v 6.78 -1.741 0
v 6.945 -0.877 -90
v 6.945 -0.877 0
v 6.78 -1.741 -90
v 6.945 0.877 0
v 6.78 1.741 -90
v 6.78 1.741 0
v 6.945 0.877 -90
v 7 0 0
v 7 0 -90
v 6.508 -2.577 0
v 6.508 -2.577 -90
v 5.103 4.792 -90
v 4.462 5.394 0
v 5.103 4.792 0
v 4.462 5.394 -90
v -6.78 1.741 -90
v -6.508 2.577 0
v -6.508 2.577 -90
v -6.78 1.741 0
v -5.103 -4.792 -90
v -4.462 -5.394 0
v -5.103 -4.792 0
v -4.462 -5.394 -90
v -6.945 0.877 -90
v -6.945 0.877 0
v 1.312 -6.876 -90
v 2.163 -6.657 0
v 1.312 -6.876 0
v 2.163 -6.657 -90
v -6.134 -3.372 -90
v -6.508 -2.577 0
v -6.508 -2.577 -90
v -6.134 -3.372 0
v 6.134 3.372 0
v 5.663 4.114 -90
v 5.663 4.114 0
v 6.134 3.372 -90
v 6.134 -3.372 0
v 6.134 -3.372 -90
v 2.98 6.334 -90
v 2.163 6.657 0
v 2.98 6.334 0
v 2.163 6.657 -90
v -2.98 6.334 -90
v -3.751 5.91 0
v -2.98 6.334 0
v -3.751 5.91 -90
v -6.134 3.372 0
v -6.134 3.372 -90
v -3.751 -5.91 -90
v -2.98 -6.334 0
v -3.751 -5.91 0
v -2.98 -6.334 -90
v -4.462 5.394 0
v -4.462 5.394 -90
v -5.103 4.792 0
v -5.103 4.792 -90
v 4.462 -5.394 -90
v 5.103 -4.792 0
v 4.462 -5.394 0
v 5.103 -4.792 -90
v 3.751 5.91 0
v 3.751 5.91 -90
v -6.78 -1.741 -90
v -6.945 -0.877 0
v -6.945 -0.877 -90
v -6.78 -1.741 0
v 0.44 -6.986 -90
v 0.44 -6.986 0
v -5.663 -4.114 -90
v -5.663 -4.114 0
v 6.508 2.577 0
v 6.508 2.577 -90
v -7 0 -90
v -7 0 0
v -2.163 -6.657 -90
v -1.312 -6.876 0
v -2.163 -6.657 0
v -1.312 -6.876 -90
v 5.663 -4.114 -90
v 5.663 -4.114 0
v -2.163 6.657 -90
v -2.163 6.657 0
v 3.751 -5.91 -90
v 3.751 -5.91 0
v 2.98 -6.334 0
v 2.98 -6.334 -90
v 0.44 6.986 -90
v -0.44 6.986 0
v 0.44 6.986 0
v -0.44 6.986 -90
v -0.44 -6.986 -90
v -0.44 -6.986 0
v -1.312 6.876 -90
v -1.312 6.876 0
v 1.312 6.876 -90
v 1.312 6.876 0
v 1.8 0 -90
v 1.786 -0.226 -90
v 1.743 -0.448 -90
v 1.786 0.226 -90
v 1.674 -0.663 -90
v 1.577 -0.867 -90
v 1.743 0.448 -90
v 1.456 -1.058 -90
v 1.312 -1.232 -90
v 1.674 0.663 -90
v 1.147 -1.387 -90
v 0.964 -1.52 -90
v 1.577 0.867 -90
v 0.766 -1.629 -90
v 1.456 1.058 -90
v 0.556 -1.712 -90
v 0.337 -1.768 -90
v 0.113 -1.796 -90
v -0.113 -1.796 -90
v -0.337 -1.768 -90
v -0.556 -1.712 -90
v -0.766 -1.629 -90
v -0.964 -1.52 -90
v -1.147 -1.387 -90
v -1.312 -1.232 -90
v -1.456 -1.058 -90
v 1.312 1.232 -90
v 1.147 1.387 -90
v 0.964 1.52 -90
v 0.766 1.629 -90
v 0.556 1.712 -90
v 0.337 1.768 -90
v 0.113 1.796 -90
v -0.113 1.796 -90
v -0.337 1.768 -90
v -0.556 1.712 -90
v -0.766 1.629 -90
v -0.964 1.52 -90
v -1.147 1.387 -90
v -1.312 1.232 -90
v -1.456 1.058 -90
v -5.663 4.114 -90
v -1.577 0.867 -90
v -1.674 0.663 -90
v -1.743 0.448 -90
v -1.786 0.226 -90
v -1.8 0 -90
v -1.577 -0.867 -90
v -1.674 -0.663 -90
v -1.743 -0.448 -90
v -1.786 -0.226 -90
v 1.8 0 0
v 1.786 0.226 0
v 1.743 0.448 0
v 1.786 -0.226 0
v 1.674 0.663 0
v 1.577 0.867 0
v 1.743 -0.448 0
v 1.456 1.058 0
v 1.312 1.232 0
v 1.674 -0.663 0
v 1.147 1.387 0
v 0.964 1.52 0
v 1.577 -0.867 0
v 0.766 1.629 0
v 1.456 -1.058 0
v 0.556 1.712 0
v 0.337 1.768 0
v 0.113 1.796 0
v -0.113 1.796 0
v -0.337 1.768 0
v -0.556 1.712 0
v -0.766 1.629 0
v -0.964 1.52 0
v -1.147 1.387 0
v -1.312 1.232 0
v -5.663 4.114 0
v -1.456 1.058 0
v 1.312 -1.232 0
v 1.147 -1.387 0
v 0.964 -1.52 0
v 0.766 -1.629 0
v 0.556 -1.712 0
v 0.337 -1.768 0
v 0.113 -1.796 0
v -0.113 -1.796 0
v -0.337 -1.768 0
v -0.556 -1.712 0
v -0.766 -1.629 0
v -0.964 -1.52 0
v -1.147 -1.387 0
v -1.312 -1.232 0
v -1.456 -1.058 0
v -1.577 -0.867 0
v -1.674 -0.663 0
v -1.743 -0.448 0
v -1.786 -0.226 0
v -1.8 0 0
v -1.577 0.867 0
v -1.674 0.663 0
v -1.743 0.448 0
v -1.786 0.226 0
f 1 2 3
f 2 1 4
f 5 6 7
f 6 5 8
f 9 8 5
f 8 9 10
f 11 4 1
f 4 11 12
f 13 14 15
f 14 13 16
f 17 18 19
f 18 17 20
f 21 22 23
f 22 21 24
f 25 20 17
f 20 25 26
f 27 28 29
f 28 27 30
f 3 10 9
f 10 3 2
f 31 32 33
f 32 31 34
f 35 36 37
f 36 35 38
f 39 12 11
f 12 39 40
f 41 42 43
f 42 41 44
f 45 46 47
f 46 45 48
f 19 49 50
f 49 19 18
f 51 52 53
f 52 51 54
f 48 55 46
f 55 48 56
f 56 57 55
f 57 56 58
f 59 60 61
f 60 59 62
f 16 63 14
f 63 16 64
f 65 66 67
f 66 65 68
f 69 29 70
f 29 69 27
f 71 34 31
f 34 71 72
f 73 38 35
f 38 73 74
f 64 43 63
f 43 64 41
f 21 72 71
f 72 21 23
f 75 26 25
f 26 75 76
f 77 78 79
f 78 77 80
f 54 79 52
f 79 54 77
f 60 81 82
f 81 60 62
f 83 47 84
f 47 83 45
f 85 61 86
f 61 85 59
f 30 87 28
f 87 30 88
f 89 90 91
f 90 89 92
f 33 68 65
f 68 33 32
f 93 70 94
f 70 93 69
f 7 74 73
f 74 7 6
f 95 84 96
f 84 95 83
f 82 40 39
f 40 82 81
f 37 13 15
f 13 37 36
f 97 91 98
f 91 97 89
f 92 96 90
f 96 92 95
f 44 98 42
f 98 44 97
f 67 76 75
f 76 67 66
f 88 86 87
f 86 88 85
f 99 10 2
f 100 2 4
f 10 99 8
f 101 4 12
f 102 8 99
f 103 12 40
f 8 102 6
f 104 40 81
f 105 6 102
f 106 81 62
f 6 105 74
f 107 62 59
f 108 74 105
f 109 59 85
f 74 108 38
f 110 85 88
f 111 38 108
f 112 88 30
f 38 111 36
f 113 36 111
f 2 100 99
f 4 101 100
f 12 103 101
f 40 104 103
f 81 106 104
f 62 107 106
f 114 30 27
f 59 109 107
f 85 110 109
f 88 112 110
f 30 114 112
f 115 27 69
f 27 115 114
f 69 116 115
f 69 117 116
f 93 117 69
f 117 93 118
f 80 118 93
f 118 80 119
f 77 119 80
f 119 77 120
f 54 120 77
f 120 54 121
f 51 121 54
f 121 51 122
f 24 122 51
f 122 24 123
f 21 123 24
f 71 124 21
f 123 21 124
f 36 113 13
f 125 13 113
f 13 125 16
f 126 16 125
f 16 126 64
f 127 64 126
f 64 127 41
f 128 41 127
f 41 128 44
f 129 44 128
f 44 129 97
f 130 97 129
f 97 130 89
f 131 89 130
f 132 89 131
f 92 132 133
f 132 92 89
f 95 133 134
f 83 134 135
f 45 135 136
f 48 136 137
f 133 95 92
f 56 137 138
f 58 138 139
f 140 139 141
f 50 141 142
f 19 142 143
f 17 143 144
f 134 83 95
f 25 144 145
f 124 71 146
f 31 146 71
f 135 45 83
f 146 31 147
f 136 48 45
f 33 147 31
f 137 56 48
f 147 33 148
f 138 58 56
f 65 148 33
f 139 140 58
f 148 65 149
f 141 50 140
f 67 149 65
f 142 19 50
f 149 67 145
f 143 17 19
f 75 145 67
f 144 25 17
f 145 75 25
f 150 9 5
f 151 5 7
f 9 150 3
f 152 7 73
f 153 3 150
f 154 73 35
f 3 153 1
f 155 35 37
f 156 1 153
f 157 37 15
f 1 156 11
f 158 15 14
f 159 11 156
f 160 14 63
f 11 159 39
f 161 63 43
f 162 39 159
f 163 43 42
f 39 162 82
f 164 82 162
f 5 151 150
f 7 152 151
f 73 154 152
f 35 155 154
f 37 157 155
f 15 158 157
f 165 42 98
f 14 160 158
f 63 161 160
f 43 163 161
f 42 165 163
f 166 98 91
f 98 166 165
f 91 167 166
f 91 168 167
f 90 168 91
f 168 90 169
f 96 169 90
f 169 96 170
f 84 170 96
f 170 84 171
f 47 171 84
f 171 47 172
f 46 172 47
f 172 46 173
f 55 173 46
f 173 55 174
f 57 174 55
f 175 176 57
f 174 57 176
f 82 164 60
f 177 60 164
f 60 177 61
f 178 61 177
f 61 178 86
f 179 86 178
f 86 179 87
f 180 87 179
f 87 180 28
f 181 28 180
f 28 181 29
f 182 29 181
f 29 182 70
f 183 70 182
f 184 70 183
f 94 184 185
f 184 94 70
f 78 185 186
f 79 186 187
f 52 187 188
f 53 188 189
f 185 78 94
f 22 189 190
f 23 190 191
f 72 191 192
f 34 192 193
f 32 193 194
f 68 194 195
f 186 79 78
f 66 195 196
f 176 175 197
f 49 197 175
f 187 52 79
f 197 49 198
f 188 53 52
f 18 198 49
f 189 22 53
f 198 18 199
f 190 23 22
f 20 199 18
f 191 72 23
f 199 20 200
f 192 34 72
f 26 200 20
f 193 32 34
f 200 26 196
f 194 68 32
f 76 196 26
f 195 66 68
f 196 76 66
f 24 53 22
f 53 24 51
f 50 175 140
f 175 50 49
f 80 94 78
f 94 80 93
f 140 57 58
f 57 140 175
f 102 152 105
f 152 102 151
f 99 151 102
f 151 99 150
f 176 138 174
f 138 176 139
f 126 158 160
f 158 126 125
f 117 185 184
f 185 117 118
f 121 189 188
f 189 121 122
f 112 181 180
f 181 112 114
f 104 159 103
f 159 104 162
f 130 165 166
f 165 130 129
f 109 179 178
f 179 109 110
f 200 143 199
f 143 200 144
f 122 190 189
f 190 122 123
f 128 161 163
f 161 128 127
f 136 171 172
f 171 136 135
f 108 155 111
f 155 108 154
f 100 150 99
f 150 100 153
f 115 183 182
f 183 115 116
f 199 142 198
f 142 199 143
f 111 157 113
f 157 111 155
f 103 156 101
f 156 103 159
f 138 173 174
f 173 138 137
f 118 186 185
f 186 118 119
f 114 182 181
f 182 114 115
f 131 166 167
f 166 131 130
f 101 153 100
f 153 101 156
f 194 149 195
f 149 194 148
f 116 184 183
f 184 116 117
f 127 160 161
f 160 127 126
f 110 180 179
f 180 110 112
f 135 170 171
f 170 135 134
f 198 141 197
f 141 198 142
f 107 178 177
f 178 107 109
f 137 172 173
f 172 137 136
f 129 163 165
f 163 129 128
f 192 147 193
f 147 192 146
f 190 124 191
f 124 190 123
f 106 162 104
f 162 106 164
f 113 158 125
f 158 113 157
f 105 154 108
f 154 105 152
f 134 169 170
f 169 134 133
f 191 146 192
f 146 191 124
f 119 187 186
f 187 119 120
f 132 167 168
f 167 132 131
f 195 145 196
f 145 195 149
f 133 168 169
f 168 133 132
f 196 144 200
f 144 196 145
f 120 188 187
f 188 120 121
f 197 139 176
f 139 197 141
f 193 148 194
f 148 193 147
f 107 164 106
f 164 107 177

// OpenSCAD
$fn = 50;


difference() {
	union() {
		translate(v = [0, 0, -90.0000000000]) {
			cylinder(h = 90, r = 7.0000000000);
		}
		cylinder(h = 0, r = 16.0000000000);
	}
	union() {
		#translate(v = [0, 0, -90]) {
			cylinder(h = 90, r = 1.8000000000);
		}
	}
}
